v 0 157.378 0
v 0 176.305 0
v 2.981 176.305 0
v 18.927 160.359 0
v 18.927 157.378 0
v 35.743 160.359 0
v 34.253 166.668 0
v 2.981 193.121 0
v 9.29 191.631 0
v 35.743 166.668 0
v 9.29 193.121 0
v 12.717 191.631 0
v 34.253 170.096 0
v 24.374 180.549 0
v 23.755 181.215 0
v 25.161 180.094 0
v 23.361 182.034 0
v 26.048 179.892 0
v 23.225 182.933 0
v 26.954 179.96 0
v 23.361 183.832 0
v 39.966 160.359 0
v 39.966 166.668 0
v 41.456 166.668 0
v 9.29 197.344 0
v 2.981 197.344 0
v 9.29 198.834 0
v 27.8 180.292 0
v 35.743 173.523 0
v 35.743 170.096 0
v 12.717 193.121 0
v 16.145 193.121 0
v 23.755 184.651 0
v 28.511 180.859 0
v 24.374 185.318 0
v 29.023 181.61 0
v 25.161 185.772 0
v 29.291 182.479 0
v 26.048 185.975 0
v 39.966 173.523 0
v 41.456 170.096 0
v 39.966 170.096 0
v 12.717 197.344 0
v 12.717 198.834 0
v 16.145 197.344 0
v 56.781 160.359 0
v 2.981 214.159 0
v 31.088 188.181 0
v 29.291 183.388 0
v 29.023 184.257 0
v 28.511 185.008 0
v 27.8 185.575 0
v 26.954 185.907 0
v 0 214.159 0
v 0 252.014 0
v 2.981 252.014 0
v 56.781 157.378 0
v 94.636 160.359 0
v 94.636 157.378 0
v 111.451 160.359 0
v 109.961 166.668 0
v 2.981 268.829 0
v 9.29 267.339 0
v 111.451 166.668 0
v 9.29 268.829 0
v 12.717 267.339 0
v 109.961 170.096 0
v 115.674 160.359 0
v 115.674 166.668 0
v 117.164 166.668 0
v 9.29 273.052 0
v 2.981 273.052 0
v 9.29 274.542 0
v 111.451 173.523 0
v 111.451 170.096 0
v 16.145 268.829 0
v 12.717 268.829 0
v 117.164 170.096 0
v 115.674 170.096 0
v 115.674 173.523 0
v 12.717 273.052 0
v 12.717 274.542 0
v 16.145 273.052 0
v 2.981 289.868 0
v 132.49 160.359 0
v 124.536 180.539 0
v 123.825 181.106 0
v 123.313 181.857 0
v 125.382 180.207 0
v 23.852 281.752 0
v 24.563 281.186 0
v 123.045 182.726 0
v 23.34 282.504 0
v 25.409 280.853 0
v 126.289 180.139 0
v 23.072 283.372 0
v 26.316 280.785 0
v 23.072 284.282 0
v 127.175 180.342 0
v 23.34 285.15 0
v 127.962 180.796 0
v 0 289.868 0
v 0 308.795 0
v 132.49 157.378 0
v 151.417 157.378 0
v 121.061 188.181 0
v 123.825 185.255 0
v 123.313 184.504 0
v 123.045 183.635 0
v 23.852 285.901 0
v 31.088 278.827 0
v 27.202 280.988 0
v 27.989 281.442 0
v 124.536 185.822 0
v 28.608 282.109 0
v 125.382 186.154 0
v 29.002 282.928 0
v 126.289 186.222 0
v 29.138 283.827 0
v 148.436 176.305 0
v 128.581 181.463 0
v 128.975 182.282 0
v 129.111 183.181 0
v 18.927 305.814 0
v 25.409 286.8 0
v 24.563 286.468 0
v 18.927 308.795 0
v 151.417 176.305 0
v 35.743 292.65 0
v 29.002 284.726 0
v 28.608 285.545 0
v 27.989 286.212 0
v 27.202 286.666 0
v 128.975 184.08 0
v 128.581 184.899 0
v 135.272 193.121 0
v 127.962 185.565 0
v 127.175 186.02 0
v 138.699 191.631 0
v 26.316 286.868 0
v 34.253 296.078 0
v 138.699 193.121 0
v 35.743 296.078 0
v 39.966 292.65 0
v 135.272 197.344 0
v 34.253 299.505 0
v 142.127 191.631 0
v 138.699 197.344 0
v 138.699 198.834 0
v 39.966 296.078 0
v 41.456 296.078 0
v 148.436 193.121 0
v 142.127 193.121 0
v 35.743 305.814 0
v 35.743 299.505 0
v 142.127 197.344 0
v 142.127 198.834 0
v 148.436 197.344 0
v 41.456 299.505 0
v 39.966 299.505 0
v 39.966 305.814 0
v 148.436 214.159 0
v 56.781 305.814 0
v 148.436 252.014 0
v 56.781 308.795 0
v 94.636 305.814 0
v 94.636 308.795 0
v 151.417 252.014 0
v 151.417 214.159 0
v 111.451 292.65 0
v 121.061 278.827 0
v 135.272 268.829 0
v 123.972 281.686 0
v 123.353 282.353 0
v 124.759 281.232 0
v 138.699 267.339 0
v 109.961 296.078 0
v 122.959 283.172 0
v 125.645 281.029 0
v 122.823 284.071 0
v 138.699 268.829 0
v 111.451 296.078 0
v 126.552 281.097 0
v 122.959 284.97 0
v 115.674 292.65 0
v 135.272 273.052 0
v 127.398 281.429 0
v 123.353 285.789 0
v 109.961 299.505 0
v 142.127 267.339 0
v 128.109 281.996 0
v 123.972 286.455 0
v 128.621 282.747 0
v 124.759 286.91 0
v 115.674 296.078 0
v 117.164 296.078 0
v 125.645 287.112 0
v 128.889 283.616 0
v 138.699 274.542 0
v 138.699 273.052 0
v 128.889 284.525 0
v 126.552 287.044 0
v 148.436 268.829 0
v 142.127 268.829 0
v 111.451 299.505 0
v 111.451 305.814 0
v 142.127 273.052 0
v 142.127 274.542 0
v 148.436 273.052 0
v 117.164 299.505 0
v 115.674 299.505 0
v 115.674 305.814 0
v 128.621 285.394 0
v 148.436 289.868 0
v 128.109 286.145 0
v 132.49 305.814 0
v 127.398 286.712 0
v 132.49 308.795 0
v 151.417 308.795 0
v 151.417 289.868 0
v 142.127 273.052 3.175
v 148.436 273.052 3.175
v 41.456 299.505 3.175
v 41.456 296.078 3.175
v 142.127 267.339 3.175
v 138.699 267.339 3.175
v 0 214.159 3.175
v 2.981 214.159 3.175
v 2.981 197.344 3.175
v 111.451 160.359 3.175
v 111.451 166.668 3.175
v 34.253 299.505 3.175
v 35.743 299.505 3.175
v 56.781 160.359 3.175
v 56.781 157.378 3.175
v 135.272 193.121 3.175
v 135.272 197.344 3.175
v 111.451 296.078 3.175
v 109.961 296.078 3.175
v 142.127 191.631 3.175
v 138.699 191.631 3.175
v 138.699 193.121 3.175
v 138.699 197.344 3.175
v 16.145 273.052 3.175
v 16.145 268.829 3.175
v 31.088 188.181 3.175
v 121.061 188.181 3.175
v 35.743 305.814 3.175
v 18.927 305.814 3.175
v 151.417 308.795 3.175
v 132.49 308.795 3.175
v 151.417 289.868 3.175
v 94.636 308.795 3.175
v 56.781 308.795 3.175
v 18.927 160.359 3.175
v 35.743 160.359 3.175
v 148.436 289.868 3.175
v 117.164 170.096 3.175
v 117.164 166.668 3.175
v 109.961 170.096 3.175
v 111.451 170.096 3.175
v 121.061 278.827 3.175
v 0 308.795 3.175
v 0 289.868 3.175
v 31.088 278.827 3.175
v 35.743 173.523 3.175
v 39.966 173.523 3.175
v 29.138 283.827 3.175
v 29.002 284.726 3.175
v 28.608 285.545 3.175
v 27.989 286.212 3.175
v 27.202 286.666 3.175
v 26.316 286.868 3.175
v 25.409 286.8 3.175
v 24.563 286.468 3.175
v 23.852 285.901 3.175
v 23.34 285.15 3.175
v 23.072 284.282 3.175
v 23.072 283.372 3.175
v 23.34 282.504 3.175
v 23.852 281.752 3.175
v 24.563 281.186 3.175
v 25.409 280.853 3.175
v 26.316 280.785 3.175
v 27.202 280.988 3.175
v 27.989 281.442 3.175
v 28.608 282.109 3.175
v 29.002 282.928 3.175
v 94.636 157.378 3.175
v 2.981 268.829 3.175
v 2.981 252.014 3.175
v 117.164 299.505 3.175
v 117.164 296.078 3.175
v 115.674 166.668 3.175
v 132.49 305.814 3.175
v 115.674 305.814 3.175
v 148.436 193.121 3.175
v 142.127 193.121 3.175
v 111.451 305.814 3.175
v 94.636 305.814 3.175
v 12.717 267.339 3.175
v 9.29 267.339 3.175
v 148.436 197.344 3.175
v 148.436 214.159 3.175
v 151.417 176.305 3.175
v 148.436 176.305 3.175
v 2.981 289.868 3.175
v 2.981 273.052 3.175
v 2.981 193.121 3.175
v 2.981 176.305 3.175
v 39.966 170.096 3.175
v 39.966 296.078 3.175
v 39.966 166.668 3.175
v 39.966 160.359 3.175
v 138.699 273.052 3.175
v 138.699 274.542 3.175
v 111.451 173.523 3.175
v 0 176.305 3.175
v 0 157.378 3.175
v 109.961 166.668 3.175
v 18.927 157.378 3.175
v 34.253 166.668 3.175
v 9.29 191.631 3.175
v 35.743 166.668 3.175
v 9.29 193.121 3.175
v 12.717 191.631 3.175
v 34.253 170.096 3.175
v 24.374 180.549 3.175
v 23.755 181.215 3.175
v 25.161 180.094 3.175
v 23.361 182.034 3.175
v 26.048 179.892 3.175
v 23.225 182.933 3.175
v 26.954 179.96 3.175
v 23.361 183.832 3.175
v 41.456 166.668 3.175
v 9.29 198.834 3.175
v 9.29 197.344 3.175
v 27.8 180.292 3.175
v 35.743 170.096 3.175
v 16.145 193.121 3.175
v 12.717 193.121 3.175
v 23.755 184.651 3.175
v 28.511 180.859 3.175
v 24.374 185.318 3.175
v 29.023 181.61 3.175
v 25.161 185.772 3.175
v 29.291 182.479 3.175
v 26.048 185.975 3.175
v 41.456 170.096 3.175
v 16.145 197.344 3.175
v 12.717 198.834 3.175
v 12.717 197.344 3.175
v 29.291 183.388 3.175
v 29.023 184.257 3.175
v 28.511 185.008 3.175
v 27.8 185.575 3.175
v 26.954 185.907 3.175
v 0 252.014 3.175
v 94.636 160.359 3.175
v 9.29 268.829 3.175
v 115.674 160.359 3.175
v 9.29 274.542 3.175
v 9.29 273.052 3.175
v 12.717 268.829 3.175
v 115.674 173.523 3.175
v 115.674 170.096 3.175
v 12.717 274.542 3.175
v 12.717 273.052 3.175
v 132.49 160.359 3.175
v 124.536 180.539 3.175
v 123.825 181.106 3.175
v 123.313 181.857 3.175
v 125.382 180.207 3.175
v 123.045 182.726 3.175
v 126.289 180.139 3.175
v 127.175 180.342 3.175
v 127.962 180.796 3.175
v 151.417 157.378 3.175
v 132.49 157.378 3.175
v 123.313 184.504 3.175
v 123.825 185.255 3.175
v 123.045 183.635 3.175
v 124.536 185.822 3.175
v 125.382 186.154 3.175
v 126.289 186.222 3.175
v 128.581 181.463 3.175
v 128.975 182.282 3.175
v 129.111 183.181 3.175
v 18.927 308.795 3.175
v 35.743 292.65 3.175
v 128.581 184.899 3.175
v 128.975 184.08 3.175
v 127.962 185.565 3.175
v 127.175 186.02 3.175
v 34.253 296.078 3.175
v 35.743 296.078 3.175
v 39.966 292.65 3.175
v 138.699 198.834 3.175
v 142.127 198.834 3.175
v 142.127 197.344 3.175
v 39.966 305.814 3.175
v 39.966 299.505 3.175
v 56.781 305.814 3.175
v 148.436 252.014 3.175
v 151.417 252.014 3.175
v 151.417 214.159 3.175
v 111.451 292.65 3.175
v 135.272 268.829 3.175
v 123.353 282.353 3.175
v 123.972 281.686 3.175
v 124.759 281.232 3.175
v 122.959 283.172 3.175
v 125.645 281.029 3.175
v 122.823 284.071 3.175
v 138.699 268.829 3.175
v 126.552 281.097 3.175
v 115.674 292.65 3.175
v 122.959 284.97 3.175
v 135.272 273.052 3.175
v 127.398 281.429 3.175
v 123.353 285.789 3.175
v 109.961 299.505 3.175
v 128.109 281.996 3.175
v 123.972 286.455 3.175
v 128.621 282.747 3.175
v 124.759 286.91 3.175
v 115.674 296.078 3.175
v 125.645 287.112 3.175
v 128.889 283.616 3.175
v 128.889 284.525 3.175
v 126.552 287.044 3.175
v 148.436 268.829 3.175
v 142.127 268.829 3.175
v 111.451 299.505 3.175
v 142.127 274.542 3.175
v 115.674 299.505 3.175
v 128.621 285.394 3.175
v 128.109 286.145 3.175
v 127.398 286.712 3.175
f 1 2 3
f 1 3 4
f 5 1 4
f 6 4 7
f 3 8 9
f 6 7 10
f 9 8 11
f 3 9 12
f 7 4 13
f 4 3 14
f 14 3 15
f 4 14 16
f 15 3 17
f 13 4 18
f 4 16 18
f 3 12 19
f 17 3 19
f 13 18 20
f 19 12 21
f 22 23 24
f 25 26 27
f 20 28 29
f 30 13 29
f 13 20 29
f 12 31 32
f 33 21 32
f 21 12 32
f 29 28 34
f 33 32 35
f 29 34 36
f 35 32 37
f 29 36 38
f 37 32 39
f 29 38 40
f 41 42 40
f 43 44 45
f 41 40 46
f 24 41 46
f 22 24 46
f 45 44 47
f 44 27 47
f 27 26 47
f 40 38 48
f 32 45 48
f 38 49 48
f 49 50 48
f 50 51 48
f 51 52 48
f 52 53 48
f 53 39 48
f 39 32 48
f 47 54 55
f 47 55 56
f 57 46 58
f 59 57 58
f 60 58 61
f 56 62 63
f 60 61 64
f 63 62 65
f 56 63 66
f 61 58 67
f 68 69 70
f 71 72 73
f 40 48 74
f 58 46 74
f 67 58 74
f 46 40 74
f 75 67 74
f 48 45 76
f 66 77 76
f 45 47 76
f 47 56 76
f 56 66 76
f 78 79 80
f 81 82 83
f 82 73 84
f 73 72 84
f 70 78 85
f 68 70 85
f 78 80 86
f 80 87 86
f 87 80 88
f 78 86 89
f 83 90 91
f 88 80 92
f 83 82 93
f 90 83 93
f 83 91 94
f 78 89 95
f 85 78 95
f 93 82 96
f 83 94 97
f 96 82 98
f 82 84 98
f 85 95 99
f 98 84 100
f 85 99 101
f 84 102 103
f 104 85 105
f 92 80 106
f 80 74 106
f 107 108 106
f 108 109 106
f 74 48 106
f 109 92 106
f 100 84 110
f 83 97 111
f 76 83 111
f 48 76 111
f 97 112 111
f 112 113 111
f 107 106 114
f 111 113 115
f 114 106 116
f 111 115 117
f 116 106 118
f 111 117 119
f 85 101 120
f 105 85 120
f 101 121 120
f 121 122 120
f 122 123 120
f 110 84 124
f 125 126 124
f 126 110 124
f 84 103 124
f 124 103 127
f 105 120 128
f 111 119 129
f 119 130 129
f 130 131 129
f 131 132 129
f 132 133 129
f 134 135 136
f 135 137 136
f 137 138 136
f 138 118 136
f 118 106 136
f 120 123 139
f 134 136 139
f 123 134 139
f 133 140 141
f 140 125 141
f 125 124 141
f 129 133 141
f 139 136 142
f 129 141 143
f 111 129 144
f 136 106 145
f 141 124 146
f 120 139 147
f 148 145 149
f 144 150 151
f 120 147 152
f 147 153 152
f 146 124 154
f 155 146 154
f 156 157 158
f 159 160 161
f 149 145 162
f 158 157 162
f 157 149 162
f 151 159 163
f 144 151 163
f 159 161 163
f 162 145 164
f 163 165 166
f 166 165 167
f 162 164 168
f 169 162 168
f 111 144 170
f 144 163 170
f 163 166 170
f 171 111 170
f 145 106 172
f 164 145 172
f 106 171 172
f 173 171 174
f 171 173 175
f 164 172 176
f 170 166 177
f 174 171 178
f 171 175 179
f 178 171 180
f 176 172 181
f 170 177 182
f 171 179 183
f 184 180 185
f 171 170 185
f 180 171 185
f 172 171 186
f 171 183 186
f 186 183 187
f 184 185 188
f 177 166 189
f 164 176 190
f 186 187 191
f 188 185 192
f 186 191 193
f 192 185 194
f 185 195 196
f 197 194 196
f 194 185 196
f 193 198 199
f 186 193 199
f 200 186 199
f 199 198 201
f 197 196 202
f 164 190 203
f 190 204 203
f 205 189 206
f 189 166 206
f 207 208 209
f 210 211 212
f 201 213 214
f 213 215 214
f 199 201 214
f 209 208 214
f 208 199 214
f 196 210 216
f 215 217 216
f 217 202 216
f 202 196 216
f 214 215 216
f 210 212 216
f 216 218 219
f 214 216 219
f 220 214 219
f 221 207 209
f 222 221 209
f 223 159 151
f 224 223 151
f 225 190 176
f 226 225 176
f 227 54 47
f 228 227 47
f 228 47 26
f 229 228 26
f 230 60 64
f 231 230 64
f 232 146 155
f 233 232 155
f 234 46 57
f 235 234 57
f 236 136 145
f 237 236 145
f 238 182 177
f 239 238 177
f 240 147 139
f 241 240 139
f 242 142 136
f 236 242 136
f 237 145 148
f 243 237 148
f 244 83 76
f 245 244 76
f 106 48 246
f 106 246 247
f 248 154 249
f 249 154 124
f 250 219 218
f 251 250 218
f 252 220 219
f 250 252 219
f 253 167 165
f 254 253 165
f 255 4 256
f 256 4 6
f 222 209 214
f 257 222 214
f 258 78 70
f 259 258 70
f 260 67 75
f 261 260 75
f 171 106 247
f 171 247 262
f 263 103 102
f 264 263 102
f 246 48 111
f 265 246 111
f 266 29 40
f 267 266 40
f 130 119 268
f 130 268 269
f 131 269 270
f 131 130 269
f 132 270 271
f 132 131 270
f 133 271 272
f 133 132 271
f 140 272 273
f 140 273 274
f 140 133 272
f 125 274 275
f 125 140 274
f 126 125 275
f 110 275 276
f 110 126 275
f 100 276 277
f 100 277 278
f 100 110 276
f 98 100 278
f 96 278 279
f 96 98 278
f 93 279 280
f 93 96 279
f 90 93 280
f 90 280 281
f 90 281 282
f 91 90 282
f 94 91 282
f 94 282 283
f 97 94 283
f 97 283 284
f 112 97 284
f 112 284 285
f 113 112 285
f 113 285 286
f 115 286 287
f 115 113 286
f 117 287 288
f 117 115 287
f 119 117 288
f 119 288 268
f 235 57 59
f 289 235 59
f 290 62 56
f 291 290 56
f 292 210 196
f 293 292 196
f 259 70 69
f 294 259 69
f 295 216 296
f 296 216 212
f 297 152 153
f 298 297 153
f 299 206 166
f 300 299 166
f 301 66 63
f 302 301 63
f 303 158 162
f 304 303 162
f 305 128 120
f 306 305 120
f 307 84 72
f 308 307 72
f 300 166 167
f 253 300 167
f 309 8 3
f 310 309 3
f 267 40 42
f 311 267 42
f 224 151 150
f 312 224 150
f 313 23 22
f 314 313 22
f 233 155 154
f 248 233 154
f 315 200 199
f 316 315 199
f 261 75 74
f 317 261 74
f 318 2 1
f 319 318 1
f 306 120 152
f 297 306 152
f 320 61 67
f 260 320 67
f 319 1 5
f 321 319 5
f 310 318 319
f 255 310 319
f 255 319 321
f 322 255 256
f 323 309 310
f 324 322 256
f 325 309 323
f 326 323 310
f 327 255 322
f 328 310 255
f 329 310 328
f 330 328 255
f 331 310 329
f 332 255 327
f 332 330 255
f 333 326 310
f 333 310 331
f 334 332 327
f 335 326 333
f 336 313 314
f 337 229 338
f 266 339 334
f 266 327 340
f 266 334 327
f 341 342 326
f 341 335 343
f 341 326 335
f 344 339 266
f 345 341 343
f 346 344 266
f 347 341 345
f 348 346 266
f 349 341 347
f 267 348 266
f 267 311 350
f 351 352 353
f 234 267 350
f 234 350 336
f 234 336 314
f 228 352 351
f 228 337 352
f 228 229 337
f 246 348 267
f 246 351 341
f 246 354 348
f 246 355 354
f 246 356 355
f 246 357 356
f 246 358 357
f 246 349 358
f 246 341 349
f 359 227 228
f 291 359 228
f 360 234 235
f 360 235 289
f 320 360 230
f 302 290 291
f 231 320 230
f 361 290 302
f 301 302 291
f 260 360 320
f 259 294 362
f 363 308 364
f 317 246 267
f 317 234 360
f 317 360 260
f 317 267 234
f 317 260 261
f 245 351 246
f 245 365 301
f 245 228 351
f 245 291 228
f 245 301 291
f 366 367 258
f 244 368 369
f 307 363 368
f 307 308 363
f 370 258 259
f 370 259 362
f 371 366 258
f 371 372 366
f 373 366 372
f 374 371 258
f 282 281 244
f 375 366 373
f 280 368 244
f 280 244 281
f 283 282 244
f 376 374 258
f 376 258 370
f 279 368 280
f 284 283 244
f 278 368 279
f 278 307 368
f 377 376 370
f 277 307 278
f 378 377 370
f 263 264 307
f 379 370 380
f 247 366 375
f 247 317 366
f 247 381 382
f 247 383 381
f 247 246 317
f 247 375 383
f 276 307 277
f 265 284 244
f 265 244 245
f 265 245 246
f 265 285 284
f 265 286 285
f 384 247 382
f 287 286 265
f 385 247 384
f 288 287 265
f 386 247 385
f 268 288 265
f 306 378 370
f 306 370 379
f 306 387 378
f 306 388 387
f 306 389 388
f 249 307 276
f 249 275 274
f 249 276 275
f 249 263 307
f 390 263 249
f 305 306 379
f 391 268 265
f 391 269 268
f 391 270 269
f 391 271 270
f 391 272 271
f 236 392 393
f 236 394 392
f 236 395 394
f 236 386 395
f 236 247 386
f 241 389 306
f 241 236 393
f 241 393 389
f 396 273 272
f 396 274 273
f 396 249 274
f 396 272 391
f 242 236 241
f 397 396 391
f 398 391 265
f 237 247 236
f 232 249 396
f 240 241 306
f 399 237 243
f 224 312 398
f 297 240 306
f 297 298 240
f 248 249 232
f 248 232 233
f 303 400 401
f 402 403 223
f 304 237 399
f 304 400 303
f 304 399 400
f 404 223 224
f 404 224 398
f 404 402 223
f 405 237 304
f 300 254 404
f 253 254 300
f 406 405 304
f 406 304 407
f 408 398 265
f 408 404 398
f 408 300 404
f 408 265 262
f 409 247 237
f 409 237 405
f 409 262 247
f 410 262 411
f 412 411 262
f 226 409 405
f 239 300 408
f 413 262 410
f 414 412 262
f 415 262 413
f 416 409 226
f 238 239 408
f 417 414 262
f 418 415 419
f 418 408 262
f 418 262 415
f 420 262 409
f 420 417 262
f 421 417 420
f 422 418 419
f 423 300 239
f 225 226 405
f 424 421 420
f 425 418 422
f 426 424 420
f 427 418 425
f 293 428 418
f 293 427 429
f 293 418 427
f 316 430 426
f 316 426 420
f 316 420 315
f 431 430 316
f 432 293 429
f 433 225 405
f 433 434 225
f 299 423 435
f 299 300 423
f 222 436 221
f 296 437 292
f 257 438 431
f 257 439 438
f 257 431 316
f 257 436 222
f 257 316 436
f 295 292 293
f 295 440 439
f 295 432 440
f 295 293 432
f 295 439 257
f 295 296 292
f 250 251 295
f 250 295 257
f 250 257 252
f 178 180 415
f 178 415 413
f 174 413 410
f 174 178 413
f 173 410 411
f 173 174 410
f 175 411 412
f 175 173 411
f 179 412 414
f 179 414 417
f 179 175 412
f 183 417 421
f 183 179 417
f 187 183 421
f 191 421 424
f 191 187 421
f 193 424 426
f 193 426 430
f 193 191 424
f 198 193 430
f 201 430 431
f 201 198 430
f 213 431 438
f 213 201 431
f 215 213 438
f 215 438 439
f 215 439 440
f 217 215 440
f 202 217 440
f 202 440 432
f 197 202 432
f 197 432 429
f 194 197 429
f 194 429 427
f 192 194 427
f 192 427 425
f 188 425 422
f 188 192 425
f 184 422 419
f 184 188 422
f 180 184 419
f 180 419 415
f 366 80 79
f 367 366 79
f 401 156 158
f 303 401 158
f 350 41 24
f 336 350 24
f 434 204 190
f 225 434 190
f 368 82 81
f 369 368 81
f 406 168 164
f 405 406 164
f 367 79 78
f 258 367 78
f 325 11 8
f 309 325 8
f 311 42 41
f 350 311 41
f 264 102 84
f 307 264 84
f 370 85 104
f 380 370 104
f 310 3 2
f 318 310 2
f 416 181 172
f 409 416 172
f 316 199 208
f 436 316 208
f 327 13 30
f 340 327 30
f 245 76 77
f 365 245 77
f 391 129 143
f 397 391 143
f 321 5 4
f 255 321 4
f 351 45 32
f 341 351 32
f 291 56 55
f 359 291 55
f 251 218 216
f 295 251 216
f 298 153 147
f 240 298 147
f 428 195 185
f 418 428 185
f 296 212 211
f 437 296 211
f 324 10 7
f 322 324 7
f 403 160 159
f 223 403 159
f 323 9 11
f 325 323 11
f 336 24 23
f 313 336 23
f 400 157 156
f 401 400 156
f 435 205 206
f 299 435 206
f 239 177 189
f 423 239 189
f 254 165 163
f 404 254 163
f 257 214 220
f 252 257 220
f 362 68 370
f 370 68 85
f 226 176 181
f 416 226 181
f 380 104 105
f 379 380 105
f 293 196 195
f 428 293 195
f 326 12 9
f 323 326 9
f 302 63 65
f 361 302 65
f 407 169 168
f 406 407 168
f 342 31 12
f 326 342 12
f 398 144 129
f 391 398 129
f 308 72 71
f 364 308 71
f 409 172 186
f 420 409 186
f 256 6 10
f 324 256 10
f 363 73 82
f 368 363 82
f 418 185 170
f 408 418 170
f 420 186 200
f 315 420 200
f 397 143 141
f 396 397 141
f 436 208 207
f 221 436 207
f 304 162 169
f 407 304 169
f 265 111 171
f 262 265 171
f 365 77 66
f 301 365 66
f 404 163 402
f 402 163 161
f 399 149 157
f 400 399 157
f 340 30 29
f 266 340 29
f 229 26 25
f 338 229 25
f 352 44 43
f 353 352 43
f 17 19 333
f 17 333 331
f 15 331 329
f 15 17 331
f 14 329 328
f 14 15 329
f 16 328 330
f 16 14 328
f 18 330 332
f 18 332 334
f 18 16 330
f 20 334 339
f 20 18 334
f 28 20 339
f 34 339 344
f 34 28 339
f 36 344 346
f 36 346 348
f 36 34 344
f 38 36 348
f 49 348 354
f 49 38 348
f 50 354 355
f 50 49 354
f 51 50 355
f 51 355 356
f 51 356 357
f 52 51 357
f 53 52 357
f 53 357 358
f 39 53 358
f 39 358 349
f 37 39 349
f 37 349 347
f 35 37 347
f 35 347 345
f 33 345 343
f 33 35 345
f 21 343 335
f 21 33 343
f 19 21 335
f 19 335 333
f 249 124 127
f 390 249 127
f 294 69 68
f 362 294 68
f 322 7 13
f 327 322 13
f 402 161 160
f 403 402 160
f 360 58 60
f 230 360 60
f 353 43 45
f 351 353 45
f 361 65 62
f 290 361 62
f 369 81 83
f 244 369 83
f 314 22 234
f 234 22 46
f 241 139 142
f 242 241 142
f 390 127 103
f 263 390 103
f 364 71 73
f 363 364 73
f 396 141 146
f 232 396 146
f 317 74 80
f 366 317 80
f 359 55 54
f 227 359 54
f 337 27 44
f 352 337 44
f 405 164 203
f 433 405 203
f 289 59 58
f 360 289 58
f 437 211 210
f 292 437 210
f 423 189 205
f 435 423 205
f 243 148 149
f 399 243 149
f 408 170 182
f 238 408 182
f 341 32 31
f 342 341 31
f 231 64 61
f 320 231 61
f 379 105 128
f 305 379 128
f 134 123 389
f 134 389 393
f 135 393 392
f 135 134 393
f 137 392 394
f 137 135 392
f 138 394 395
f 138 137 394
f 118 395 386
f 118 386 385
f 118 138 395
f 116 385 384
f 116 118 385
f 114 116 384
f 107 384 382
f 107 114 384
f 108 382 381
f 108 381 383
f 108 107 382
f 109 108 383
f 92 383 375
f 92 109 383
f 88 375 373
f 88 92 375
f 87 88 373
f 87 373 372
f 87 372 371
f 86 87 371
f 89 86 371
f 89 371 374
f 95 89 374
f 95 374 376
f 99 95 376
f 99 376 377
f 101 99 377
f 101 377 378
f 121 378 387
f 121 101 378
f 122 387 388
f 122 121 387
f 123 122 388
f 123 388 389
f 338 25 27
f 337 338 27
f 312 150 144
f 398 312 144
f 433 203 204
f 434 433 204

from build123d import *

# Parameters (mm, degrees)
SKETCH1_R           = 3.05
SKETCH1_W           = 89.973098966
SKETCH1_H           = 90.646237782
BOSS_EXTRUDE1_DEPTH = 3.175


with BuildPart() as part:
    # Sketch1 → Boss-Extrude1 (new body)
    with BuildSketch(Plane.XY):
        Polygon((0, 308.79500376), (0, 289.867896869), (2.980646754, 289.867896869), (2.980646754, 273.05208143), (9.289682385, 273.05208143), (9.289682385, 274.542404807), (12.717426152, 274.542404807), (12.717426152, 273.05208143), (16.14516992, 273.05208143), (16.14516992, 268.829498528), (12.717426152, 268.829498528), (12.717426152, 267.33917515), (9.289682385, 267.33917515), (9.289682385, 268.829498528), (2.980646754, 268.829498528), (2.980646754, 252.013683088), (0, 252.013683088), (0, 214.159469307), (2.980646754, 214.159469307), (2.980646754, 197.343653867), (9.289682385, 197.343653867), (9.289682385, 198.833977244), (12.717426152, 198.833977244), (12.717426152, 197.343653867), (16.14516992, 197.343653867), (16.14516992, 193.121070965), (12.717426152, 193.121070965), (12.717426152, 191.630747588), (9.289682385, 191.630747588), (9.289682385, 193.121070965), (2.980646754, 193.121070965), (2.980646754, 176.305255525), (0, 176.305255525), (0, 157.378148634), (18.927106891, 157.378148634), (18.927106891, 160.358795389), (35.74292233, 160.358795389), (35.74292233, 166.667831019), (34.252598953, 166.667831019), (34.252598953, 170.095574787), (35.74292233, 170.095574787), (35.74292233, 173.523318554), (39.965505232, 173.523318554), (39.965505232, 170.095574787), (41.45582861, 170.095574787), (41.45582861, 166.667831019), (39.965505232, 166.667831019), (39.965505232, 160.358795389), (56.781320672, 160.358795389), (56.781320672, 157.378148634), (94.635534454, 157.378148634), (94.635534454, 160.358795389), (111.451349893, 160.358795389), (111.451349893, 166.667831019), (109.961026516, 166.667831019), (109.961026516, 170.095574787), (111.451349893, 170.095574787), (111.451349893, 173.523318554), (115.673932795, 173.523318554), (115.673932795, 170.095574787), (117.164256172, 170.095574787), (117.164256172, 166.667831019), (115.673932795, 166.667831019), (115.673932795, 160.358795389), (132.489748235, 160.358795389), (132.489748235, 157.378148634), (151.416855126, 157.378148634), (151.416855126, 176.305255525), (148.436208371, 176.305255525), (148.436208371, 193.121070965), (142.127172741, 193.121070965), (142.127172741, 191.630747588), (138.699428973, 191.630747588), (138.699428973, 193.121070965), (135.271685206, 193.121070965), (135.271685206, 197.343653867), (138.699428973, 197.343653867), (138.699428973, 198.833977244), (142.127172741, 198.833977244), (142.127172741, 197.343653867), (148.436208371, 197.343653867), (148.436208371, 214.159469307), (151.416855126, 214.159469307), (151.416855126, 252.013683088), (148.436208371, 252.013683088), (148.436208371, 268.829498528), (142.127172741, 268.829498528), (142.127172741, 267.33917515), (138.699428973, 267.33917515), (138.699428973, 268.829498528), (135.271685206, 268.829498528), (135.271685206, 273.05208143), (138.699428973, 273.05208143), (138.699428973, 274.542404807), (142.127172741, 274.542404807), (142.127172741, 273.05208143), (148.436208371, 273.05208143), (148.436208371, 289.867896869), (151.416855126, 289.867896869), (151.416855126, 308.79500376), (132.489748235, 308.79500376), (132.489748235, 305.814357006), (115.673932795, 305.814357006), (115.673932795, 299.505321375), (117.164256172, 299.505321375), (117.164256172, 296.077577608), (115.673932795, 296.077577608), (115.673932795, 292.64983384), (111.451349893, 292.64983384), (111.451349893, 296.077577608), (109.961026516, 296.077577608), (109.961026516, 299.505321375), (111.451349893, 299.505321375), (111.451349893, 305.814357006), (94.635534454, 305.814357006), (94.635534454, 308.79500376), (56.781320672, 308.79500376), (56.781320672, 305.814357006), (39.965505232, 305.814357006), (39.965505232, 299.505321375), (41.45582861, 299.505321375), (41.45582861, 296.077577608), (39.965505232, 296.077577608), (39.965505232, 292.64983384), (35.74292233, 292.64983384), (35.74292233, 296.077577608), (34.252598953, 296.077577608), (34.252598953, 299.505321375), (35.74292233, 299.505321375), (35.74292233, 305.814357006), (18.927106891, 305.814357006), (18.927106891, 308.79500376), align=None)
        with Locations((26.087654184, 283.82694987)):
            Circle(SKETCH1_R, mode=Mode.SUBTRACT)
        with Locations(Location((125.873209609, 284.070712088, 0), (0, 0, 180))):
            Circle(SKETCH1_R, mode=Mode.SUBTRACT)
        with Locations((126.06075315, 183.180712088)):
            Circle(SKETCH1_R, mode=Mode.SUBTRACT)
        with Locations(Location((26.27542779, 182.933192277, 0), (0, 0, 180))):
            Circle(SKETCH1_R, mode=Mode.SUBTRACT)
        with Locations((76.074203667, 233.503830979)):
            Rectangle(SKETCH1_W, SKETCH1_H, mode=Mode.SUBTRACT)
    extrude(amount=BOSS_EXTRUDE1_DEPTH)


solid = part.part
